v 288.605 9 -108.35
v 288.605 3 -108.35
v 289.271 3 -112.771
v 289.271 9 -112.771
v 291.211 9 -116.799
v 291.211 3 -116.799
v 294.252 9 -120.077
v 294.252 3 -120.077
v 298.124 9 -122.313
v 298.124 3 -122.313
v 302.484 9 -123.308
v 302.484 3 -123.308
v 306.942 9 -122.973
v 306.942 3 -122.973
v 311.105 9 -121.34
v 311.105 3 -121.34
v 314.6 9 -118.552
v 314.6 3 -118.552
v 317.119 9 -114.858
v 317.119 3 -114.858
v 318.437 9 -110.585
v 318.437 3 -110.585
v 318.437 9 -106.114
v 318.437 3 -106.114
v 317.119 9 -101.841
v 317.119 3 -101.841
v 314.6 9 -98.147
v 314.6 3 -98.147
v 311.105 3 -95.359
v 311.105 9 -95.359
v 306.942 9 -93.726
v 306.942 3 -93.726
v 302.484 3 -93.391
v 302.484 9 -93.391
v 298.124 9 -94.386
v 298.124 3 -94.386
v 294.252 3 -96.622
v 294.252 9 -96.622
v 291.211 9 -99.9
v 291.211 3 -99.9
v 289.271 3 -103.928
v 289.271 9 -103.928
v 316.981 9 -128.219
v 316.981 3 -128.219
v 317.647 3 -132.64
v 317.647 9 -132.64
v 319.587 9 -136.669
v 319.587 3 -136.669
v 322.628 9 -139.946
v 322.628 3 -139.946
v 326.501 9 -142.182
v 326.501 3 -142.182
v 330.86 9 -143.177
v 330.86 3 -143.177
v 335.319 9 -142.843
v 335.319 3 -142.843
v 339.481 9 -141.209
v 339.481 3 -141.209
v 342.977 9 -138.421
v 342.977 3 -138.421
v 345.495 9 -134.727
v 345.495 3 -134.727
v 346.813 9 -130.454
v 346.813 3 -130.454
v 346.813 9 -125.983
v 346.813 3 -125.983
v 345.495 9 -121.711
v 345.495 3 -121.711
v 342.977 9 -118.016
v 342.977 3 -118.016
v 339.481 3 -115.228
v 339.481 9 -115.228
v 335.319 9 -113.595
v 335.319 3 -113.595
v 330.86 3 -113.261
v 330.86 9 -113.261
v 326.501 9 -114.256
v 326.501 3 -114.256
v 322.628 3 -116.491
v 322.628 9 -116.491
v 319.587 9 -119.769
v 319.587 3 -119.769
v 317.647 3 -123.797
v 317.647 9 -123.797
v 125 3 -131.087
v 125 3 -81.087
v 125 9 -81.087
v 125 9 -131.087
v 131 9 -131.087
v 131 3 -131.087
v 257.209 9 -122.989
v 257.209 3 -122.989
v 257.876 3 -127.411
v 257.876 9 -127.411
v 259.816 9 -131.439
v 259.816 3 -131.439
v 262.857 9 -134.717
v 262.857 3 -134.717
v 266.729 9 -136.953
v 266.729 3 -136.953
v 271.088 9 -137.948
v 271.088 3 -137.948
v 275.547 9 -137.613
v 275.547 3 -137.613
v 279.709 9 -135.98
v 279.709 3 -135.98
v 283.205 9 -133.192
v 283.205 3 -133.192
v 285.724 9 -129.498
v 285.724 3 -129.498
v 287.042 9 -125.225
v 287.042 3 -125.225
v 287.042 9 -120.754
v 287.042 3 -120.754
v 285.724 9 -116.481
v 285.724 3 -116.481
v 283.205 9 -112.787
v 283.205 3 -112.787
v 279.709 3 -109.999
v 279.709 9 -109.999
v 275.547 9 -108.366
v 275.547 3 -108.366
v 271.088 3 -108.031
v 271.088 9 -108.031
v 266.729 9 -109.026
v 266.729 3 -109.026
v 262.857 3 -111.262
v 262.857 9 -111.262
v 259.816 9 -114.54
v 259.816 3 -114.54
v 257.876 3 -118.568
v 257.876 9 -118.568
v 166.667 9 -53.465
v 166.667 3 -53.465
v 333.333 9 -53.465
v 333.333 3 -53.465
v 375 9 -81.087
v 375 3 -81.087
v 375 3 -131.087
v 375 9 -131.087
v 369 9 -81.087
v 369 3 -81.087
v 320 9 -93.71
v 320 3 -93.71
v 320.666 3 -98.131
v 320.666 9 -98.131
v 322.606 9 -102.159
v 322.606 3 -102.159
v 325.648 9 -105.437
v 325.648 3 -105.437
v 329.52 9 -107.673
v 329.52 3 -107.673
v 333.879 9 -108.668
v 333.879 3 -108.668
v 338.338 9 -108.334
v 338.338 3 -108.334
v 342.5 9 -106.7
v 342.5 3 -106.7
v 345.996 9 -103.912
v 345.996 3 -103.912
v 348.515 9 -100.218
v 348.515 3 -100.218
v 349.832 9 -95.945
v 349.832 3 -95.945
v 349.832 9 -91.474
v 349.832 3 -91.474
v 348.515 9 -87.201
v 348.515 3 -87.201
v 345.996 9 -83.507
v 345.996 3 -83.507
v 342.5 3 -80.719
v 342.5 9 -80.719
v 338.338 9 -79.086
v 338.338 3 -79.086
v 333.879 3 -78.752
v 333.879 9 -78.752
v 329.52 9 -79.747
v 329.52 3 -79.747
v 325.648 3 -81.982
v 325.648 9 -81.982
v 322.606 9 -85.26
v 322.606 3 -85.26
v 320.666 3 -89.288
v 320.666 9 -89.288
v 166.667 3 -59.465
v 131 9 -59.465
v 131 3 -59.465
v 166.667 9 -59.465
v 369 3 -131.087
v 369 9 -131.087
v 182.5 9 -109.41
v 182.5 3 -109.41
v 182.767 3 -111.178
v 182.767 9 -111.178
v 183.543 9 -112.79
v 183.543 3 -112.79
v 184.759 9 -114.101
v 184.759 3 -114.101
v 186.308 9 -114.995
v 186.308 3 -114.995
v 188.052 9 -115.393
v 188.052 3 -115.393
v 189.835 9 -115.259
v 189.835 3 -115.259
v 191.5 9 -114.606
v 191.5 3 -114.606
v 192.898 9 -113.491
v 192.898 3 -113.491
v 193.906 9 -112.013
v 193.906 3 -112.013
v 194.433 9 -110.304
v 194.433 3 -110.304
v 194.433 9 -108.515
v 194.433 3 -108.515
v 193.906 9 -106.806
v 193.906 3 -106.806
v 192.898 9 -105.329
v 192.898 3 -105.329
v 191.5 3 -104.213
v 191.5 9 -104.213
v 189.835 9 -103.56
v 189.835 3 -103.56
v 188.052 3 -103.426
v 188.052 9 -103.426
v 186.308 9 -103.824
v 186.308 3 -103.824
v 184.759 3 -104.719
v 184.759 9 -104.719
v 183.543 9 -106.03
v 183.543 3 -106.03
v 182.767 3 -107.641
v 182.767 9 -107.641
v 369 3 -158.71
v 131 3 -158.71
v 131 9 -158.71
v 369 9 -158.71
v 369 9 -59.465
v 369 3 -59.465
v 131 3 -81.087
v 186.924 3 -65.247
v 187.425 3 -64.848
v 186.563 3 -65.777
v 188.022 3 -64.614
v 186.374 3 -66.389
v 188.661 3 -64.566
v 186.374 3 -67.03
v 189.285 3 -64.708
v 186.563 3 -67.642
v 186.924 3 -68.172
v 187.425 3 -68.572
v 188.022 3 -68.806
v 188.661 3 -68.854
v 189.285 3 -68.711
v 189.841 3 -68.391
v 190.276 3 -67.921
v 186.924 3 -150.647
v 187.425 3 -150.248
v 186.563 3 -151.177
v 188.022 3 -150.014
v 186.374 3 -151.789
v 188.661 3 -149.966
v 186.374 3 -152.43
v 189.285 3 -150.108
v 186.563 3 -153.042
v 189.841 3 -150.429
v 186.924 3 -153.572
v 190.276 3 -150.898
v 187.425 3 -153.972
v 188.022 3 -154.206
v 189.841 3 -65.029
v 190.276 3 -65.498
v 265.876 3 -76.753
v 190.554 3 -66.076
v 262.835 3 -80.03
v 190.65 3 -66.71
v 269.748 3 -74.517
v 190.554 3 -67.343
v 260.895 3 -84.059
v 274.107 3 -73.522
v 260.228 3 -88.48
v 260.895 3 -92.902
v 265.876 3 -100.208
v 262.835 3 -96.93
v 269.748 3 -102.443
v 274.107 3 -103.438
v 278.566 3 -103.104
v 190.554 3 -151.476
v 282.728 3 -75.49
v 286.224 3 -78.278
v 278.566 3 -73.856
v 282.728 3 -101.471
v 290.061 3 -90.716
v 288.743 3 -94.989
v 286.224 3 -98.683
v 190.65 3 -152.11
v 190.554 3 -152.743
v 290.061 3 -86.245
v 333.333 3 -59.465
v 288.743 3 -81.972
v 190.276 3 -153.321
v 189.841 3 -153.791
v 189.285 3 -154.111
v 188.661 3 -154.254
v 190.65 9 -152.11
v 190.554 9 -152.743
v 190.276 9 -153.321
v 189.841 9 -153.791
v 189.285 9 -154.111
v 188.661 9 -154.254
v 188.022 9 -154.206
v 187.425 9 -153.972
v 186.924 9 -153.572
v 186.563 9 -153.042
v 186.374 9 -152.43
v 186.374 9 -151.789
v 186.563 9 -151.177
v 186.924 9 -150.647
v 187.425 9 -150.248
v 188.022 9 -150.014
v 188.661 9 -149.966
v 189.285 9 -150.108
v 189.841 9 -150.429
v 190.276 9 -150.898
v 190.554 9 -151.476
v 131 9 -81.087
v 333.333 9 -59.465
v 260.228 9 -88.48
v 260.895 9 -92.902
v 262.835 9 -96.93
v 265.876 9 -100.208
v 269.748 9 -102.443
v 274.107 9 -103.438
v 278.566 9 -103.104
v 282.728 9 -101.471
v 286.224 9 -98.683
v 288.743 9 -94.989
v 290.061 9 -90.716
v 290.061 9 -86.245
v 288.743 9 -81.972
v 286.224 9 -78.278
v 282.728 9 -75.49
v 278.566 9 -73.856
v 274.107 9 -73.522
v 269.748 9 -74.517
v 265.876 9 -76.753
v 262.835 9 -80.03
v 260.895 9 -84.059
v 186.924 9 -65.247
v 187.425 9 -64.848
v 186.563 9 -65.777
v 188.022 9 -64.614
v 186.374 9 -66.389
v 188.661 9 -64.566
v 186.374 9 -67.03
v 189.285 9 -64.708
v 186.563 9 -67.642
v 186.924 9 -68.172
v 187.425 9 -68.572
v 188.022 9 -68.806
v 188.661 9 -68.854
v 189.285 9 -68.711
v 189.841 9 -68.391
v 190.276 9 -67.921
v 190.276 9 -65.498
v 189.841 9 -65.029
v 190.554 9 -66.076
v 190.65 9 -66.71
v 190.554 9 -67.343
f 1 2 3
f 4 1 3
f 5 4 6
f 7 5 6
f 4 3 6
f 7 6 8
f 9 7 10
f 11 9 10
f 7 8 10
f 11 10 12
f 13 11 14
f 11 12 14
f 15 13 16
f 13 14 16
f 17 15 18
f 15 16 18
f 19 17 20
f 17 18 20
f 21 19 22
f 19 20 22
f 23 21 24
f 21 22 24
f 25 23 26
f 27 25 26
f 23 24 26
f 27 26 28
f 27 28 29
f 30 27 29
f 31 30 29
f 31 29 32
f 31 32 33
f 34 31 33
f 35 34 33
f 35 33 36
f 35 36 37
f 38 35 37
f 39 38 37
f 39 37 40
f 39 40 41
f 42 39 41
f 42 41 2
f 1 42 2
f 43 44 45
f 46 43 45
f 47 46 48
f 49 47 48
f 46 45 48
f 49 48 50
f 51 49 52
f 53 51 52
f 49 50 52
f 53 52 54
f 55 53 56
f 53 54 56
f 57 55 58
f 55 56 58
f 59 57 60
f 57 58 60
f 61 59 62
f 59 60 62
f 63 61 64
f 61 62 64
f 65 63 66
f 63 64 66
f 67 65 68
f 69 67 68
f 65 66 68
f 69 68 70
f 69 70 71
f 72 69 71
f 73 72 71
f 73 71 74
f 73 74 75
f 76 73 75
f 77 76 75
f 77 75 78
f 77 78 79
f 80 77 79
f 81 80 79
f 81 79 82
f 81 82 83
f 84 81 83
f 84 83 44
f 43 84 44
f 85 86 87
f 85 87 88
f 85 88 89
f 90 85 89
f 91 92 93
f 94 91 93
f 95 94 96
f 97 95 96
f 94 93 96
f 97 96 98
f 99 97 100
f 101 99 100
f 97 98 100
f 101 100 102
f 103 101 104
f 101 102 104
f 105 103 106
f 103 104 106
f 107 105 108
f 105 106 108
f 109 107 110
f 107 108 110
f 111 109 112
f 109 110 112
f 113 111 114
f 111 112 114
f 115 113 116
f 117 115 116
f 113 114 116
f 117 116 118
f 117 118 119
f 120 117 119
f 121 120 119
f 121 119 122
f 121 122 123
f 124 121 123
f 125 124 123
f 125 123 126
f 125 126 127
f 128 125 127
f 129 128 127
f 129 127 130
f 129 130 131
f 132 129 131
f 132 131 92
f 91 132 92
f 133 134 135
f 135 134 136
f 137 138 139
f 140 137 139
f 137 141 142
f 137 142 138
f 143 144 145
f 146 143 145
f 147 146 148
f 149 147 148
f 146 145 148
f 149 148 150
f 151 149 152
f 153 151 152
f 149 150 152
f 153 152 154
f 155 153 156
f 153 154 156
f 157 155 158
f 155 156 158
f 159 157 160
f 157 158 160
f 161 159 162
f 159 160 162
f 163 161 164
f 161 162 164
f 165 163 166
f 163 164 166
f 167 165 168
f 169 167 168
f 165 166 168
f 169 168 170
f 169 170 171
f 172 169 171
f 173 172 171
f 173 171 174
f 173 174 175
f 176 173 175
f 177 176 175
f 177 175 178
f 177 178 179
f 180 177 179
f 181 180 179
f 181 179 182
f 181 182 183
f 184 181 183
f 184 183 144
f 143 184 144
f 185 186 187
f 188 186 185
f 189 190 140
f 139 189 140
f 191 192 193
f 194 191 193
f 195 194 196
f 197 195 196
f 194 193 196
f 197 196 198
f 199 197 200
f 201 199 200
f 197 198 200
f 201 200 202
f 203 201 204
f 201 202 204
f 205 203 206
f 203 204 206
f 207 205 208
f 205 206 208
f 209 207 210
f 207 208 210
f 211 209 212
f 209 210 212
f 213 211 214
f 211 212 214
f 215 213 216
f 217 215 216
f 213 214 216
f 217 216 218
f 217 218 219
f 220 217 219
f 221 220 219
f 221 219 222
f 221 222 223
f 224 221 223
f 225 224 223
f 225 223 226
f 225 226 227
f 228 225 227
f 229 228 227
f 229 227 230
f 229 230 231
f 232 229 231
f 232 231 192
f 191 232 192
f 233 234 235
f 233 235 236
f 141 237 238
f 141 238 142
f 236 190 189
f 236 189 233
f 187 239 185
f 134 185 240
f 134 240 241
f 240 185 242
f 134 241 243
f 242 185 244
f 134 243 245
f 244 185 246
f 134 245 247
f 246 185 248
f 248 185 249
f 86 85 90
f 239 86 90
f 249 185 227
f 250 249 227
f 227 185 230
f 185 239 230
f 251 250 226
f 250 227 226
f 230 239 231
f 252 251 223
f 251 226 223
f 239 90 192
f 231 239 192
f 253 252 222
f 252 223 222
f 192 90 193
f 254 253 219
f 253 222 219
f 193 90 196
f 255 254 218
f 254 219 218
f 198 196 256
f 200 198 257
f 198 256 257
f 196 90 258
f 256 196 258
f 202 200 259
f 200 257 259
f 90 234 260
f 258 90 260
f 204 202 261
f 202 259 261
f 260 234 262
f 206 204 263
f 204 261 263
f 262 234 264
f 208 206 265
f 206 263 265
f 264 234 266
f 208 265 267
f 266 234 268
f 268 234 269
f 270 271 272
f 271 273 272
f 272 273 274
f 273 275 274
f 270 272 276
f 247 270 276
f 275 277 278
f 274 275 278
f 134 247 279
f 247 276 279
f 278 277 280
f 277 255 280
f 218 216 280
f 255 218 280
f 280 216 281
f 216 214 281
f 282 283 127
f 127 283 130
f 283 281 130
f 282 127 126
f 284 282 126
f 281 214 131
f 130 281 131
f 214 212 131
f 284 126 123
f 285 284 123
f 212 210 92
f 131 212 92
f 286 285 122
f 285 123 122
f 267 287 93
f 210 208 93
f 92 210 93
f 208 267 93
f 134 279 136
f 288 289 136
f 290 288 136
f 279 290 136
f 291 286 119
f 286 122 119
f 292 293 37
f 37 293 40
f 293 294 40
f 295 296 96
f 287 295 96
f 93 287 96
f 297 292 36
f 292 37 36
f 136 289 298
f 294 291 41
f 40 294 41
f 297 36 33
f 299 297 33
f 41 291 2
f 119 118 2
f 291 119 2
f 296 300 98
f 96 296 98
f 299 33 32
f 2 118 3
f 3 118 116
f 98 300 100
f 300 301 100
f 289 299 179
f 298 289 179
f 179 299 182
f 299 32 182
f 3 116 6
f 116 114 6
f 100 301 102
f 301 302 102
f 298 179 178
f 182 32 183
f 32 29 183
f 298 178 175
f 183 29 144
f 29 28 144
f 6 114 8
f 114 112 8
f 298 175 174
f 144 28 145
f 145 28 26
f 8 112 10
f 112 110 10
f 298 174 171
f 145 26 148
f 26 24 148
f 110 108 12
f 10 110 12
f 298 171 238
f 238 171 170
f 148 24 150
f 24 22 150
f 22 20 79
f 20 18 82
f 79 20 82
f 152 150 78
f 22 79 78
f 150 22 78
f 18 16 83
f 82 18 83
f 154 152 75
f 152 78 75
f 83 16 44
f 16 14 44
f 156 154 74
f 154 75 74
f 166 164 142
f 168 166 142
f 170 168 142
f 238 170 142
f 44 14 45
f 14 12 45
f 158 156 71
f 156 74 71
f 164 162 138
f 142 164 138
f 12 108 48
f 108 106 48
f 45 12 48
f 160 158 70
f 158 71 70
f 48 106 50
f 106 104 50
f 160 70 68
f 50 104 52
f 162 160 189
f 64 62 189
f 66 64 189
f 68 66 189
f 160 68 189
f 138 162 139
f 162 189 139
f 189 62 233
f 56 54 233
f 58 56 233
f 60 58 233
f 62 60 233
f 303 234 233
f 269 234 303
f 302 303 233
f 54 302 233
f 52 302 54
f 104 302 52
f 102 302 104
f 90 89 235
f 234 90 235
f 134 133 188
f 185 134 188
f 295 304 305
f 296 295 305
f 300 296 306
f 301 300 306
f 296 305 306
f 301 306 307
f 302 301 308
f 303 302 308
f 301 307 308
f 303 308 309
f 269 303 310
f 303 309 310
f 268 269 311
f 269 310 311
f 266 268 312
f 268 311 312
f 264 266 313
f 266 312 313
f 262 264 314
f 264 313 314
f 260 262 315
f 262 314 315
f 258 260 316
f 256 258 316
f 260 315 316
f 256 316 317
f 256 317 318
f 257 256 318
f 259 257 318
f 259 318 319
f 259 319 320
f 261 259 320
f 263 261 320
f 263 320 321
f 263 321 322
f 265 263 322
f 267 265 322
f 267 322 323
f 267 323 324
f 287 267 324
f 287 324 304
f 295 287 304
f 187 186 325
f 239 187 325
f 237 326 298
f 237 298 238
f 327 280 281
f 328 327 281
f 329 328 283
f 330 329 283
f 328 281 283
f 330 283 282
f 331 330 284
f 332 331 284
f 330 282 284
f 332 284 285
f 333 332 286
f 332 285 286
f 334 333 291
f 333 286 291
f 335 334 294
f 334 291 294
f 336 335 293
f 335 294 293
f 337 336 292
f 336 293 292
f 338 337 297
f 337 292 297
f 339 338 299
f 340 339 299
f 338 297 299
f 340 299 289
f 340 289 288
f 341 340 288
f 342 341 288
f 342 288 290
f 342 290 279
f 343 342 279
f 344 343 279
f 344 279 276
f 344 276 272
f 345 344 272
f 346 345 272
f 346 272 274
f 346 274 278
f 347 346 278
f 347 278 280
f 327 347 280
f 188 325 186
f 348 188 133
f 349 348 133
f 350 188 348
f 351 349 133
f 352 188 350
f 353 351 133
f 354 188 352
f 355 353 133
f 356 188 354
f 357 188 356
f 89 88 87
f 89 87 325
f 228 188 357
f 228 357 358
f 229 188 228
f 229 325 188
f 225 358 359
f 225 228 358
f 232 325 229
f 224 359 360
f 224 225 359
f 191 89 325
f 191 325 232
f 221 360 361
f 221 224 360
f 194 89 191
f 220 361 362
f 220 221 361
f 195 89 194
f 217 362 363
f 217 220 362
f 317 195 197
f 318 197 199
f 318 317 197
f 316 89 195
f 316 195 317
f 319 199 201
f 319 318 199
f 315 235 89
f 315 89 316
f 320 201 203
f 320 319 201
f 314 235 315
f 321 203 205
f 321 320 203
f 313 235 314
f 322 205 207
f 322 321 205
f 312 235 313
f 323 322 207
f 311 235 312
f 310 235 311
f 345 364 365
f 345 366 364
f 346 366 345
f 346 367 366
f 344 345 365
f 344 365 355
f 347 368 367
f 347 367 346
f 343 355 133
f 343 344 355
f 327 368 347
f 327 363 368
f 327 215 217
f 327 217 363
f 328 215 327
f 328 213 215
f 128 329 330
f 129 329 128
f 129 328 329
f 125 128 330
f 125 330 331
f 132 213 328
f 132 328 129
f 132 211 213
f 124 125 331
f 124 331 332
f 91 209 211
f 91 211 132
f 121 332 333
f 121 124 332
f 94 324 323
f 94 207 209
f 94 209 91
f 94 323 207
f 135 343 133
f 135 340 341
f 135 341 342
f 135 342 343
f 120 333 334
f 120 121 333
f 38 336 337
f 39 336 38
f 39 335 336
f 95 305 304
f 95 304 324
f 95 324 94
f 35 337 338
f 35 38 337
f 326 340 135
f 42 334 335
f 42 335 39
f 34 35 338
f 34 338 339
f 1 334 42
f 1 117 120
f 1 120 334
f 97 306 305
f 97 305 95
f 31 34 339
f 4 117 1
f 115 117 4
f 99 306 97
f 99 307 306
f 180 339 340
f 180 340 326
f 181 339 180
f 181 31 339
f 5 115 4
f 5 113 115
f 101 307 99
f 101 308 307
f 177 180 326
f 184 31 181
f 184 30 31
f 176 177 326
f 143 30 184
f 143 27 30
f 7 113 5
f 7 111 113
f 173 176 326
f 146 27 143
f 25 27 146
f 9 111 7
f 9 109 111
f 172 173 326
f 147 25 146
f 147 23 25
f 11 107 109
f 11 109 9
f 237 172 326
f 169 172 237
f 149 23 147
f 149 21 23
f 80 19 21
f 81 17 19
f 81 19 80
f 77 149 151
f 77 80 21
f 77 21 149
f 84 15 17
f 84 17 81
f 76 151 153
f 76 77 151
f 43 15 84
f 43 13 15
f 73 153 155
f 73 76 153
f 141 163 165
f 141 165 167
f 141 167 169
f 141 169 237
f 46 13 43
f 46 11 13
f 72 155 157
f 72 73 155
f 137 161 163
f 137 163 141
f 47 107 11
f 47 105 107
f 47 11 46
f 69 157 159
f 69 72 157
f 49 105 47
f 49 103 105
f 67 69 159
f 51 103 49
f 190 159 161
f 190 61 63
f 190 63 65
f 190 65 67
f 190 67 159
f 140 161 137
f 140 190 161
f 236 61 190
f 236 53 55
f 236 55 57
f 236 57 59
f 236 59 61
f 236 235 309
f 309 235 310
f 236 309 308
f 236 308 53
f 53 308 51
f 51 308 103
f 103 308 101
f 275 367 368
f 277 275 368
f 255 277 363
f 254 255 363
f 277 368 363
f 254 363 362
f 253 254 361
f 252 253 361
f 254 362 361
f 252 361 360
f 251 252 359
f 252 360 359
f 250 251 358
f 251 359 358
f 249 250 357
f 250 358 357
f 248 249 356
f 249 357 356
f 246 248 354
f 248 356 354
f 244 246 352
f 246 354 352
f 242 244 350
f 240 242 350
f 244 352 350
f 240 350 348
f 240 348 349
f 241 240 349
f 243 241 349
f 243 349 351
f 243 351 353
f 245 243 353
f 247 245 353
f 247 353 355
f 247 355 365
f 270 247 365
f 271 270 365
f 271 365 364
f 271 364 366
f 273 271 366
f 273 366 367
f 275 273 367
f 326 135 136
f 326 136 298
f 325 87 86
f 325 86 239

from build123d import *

# Parameters (mm, degrees)
SKETCH1_W              = 500
SKETCH1_H              = 210.49
BOSS_EXTRUDE1_DEPTH    = 12
SKETCH2_W              = 83.333333333
SKETCH2_H              = 12
SKETCH2_W_2            = 12
CUT_EXTRUDE1_DEPTH     = 543.632509255
SKETCH3_W              = 12
SKETCH3_H              = 43.245
CUT_EXTRUDE2_DEPTH     = 543.632509255
SCALE1_SCALE           = 0.5
F_12_0MM_DOWEL_SLOT1_D = 12
M4_CLEARANCE_SLOT1_D   = 4.3
F_1_0MM_DOWEL_SLOT1_D  = 30


with BuildPart() as part:
    # Sketch1 → Boss-Extrude1 (new body)
    with BuildSketch(Plane(origin=(0, 0, 0), x_dir=(1, 0, 0), z_dir=(0, 1, 0))):
        with Locations((250, 105.245)):
            Rectangle(SKETCH1_W, SKETCH1_H)
    extrude(amount=BOSS_EXTRUDE1_DEPTH)

    # Sketch2 → Cut-Extrude1 (cut, through all)
    with BuildSketch(Plane(origin=(0, 12, 0), x_dir=(1, 0, 0), z_dir=(0, 1, 0))):
        with Locations((458.333333334, 6)):
            Rectangle(SKETCH2_W, SKETCH2_H)
        with Locations((494, 204.49)):
            Rectangle(SKETCH2_W_2, SKETCH2_H)
        with Locations((6, 204.49)):
            Rectangle(SKETCH2_W_2, SKETCH2_H)
        with Locations((41.666666666, 6)):
            Rectangle(SKETCH2_W, SKETCH2_H)
    extrude(amount=-CUT_EXTRUDE1_DEPTH, mode=Mode.SUBTRACT)

    # Sketch3 → Cut-Extrude2 (cut, through all)
    with BuildSketch(Plane(origin=(0, 12, 0), x_dir=(1, 0, 0), z_dir=(0, 1, 0))):
        with Locations((494, 33.6225)):
            Rectangle(SKETCH3_W, SKETCH3_H)
        with Locations((494, 176.8675)):
            Rectangle(SKETCH3_W, SKETCH3_H)
        with Locations((6, 176.8675)):
            Rectangle(SKETCH3_W, SKETCH3_H)
        with Locations((6, 33.6225)):
            Rectangle(SKETCH3_W, SKETCH3_H)
    extrude(amount=-CUT_EXTRUDE2_DEPTH, mode=Mode.SUBTRACT)


with BuildPart() as part_1:
    # Scale1: scaled about (250, 6, -106.929232272)
    add(part.part.scale(SCALE1_SCALE).moved(Location((125, 3, -53.464616136))))

    # Ø12.0mm Dowel Slot1 (through all)
    with Locations(Plane(origin=(0, 9, 0), x_dir=(1, 0, 0), z_dir=(0, 1, 0))):
        with Locations((188.5, 109.409616136)):
            Hole(F_12_0MM_DOWEL_SLOT1_D / 2)

    # M4 Clearance Slot1 (through all)
    with Locations(Plane(origin=(0, 3, 0), x_dir=(-1, 0, 0), z_dir=(0, -1, 0))):
        with Locations((-188.5, 152.109616136), (-188.5, 66.709616136)):
            Hole(M4_CLEARANCE_SLOT1_D / 2)

    # Ø1.0mm Dowel Slot1 (through all)
    with Locations(Plane(origin=(0, 9, 0), x_dir=(1, 0, 0), z_dir=(0, 1, 0))):
        with Locations((275.228318114, 88.480271571), (335, 93.709616136), (303.604577311, 108.349542167), (272.209154622, 122.989468197), (331.980836508, 128.218812762)):
            Hole(F_1_0MM_DOWEL_SLOT1_D / 2)


solid = part_1.part
